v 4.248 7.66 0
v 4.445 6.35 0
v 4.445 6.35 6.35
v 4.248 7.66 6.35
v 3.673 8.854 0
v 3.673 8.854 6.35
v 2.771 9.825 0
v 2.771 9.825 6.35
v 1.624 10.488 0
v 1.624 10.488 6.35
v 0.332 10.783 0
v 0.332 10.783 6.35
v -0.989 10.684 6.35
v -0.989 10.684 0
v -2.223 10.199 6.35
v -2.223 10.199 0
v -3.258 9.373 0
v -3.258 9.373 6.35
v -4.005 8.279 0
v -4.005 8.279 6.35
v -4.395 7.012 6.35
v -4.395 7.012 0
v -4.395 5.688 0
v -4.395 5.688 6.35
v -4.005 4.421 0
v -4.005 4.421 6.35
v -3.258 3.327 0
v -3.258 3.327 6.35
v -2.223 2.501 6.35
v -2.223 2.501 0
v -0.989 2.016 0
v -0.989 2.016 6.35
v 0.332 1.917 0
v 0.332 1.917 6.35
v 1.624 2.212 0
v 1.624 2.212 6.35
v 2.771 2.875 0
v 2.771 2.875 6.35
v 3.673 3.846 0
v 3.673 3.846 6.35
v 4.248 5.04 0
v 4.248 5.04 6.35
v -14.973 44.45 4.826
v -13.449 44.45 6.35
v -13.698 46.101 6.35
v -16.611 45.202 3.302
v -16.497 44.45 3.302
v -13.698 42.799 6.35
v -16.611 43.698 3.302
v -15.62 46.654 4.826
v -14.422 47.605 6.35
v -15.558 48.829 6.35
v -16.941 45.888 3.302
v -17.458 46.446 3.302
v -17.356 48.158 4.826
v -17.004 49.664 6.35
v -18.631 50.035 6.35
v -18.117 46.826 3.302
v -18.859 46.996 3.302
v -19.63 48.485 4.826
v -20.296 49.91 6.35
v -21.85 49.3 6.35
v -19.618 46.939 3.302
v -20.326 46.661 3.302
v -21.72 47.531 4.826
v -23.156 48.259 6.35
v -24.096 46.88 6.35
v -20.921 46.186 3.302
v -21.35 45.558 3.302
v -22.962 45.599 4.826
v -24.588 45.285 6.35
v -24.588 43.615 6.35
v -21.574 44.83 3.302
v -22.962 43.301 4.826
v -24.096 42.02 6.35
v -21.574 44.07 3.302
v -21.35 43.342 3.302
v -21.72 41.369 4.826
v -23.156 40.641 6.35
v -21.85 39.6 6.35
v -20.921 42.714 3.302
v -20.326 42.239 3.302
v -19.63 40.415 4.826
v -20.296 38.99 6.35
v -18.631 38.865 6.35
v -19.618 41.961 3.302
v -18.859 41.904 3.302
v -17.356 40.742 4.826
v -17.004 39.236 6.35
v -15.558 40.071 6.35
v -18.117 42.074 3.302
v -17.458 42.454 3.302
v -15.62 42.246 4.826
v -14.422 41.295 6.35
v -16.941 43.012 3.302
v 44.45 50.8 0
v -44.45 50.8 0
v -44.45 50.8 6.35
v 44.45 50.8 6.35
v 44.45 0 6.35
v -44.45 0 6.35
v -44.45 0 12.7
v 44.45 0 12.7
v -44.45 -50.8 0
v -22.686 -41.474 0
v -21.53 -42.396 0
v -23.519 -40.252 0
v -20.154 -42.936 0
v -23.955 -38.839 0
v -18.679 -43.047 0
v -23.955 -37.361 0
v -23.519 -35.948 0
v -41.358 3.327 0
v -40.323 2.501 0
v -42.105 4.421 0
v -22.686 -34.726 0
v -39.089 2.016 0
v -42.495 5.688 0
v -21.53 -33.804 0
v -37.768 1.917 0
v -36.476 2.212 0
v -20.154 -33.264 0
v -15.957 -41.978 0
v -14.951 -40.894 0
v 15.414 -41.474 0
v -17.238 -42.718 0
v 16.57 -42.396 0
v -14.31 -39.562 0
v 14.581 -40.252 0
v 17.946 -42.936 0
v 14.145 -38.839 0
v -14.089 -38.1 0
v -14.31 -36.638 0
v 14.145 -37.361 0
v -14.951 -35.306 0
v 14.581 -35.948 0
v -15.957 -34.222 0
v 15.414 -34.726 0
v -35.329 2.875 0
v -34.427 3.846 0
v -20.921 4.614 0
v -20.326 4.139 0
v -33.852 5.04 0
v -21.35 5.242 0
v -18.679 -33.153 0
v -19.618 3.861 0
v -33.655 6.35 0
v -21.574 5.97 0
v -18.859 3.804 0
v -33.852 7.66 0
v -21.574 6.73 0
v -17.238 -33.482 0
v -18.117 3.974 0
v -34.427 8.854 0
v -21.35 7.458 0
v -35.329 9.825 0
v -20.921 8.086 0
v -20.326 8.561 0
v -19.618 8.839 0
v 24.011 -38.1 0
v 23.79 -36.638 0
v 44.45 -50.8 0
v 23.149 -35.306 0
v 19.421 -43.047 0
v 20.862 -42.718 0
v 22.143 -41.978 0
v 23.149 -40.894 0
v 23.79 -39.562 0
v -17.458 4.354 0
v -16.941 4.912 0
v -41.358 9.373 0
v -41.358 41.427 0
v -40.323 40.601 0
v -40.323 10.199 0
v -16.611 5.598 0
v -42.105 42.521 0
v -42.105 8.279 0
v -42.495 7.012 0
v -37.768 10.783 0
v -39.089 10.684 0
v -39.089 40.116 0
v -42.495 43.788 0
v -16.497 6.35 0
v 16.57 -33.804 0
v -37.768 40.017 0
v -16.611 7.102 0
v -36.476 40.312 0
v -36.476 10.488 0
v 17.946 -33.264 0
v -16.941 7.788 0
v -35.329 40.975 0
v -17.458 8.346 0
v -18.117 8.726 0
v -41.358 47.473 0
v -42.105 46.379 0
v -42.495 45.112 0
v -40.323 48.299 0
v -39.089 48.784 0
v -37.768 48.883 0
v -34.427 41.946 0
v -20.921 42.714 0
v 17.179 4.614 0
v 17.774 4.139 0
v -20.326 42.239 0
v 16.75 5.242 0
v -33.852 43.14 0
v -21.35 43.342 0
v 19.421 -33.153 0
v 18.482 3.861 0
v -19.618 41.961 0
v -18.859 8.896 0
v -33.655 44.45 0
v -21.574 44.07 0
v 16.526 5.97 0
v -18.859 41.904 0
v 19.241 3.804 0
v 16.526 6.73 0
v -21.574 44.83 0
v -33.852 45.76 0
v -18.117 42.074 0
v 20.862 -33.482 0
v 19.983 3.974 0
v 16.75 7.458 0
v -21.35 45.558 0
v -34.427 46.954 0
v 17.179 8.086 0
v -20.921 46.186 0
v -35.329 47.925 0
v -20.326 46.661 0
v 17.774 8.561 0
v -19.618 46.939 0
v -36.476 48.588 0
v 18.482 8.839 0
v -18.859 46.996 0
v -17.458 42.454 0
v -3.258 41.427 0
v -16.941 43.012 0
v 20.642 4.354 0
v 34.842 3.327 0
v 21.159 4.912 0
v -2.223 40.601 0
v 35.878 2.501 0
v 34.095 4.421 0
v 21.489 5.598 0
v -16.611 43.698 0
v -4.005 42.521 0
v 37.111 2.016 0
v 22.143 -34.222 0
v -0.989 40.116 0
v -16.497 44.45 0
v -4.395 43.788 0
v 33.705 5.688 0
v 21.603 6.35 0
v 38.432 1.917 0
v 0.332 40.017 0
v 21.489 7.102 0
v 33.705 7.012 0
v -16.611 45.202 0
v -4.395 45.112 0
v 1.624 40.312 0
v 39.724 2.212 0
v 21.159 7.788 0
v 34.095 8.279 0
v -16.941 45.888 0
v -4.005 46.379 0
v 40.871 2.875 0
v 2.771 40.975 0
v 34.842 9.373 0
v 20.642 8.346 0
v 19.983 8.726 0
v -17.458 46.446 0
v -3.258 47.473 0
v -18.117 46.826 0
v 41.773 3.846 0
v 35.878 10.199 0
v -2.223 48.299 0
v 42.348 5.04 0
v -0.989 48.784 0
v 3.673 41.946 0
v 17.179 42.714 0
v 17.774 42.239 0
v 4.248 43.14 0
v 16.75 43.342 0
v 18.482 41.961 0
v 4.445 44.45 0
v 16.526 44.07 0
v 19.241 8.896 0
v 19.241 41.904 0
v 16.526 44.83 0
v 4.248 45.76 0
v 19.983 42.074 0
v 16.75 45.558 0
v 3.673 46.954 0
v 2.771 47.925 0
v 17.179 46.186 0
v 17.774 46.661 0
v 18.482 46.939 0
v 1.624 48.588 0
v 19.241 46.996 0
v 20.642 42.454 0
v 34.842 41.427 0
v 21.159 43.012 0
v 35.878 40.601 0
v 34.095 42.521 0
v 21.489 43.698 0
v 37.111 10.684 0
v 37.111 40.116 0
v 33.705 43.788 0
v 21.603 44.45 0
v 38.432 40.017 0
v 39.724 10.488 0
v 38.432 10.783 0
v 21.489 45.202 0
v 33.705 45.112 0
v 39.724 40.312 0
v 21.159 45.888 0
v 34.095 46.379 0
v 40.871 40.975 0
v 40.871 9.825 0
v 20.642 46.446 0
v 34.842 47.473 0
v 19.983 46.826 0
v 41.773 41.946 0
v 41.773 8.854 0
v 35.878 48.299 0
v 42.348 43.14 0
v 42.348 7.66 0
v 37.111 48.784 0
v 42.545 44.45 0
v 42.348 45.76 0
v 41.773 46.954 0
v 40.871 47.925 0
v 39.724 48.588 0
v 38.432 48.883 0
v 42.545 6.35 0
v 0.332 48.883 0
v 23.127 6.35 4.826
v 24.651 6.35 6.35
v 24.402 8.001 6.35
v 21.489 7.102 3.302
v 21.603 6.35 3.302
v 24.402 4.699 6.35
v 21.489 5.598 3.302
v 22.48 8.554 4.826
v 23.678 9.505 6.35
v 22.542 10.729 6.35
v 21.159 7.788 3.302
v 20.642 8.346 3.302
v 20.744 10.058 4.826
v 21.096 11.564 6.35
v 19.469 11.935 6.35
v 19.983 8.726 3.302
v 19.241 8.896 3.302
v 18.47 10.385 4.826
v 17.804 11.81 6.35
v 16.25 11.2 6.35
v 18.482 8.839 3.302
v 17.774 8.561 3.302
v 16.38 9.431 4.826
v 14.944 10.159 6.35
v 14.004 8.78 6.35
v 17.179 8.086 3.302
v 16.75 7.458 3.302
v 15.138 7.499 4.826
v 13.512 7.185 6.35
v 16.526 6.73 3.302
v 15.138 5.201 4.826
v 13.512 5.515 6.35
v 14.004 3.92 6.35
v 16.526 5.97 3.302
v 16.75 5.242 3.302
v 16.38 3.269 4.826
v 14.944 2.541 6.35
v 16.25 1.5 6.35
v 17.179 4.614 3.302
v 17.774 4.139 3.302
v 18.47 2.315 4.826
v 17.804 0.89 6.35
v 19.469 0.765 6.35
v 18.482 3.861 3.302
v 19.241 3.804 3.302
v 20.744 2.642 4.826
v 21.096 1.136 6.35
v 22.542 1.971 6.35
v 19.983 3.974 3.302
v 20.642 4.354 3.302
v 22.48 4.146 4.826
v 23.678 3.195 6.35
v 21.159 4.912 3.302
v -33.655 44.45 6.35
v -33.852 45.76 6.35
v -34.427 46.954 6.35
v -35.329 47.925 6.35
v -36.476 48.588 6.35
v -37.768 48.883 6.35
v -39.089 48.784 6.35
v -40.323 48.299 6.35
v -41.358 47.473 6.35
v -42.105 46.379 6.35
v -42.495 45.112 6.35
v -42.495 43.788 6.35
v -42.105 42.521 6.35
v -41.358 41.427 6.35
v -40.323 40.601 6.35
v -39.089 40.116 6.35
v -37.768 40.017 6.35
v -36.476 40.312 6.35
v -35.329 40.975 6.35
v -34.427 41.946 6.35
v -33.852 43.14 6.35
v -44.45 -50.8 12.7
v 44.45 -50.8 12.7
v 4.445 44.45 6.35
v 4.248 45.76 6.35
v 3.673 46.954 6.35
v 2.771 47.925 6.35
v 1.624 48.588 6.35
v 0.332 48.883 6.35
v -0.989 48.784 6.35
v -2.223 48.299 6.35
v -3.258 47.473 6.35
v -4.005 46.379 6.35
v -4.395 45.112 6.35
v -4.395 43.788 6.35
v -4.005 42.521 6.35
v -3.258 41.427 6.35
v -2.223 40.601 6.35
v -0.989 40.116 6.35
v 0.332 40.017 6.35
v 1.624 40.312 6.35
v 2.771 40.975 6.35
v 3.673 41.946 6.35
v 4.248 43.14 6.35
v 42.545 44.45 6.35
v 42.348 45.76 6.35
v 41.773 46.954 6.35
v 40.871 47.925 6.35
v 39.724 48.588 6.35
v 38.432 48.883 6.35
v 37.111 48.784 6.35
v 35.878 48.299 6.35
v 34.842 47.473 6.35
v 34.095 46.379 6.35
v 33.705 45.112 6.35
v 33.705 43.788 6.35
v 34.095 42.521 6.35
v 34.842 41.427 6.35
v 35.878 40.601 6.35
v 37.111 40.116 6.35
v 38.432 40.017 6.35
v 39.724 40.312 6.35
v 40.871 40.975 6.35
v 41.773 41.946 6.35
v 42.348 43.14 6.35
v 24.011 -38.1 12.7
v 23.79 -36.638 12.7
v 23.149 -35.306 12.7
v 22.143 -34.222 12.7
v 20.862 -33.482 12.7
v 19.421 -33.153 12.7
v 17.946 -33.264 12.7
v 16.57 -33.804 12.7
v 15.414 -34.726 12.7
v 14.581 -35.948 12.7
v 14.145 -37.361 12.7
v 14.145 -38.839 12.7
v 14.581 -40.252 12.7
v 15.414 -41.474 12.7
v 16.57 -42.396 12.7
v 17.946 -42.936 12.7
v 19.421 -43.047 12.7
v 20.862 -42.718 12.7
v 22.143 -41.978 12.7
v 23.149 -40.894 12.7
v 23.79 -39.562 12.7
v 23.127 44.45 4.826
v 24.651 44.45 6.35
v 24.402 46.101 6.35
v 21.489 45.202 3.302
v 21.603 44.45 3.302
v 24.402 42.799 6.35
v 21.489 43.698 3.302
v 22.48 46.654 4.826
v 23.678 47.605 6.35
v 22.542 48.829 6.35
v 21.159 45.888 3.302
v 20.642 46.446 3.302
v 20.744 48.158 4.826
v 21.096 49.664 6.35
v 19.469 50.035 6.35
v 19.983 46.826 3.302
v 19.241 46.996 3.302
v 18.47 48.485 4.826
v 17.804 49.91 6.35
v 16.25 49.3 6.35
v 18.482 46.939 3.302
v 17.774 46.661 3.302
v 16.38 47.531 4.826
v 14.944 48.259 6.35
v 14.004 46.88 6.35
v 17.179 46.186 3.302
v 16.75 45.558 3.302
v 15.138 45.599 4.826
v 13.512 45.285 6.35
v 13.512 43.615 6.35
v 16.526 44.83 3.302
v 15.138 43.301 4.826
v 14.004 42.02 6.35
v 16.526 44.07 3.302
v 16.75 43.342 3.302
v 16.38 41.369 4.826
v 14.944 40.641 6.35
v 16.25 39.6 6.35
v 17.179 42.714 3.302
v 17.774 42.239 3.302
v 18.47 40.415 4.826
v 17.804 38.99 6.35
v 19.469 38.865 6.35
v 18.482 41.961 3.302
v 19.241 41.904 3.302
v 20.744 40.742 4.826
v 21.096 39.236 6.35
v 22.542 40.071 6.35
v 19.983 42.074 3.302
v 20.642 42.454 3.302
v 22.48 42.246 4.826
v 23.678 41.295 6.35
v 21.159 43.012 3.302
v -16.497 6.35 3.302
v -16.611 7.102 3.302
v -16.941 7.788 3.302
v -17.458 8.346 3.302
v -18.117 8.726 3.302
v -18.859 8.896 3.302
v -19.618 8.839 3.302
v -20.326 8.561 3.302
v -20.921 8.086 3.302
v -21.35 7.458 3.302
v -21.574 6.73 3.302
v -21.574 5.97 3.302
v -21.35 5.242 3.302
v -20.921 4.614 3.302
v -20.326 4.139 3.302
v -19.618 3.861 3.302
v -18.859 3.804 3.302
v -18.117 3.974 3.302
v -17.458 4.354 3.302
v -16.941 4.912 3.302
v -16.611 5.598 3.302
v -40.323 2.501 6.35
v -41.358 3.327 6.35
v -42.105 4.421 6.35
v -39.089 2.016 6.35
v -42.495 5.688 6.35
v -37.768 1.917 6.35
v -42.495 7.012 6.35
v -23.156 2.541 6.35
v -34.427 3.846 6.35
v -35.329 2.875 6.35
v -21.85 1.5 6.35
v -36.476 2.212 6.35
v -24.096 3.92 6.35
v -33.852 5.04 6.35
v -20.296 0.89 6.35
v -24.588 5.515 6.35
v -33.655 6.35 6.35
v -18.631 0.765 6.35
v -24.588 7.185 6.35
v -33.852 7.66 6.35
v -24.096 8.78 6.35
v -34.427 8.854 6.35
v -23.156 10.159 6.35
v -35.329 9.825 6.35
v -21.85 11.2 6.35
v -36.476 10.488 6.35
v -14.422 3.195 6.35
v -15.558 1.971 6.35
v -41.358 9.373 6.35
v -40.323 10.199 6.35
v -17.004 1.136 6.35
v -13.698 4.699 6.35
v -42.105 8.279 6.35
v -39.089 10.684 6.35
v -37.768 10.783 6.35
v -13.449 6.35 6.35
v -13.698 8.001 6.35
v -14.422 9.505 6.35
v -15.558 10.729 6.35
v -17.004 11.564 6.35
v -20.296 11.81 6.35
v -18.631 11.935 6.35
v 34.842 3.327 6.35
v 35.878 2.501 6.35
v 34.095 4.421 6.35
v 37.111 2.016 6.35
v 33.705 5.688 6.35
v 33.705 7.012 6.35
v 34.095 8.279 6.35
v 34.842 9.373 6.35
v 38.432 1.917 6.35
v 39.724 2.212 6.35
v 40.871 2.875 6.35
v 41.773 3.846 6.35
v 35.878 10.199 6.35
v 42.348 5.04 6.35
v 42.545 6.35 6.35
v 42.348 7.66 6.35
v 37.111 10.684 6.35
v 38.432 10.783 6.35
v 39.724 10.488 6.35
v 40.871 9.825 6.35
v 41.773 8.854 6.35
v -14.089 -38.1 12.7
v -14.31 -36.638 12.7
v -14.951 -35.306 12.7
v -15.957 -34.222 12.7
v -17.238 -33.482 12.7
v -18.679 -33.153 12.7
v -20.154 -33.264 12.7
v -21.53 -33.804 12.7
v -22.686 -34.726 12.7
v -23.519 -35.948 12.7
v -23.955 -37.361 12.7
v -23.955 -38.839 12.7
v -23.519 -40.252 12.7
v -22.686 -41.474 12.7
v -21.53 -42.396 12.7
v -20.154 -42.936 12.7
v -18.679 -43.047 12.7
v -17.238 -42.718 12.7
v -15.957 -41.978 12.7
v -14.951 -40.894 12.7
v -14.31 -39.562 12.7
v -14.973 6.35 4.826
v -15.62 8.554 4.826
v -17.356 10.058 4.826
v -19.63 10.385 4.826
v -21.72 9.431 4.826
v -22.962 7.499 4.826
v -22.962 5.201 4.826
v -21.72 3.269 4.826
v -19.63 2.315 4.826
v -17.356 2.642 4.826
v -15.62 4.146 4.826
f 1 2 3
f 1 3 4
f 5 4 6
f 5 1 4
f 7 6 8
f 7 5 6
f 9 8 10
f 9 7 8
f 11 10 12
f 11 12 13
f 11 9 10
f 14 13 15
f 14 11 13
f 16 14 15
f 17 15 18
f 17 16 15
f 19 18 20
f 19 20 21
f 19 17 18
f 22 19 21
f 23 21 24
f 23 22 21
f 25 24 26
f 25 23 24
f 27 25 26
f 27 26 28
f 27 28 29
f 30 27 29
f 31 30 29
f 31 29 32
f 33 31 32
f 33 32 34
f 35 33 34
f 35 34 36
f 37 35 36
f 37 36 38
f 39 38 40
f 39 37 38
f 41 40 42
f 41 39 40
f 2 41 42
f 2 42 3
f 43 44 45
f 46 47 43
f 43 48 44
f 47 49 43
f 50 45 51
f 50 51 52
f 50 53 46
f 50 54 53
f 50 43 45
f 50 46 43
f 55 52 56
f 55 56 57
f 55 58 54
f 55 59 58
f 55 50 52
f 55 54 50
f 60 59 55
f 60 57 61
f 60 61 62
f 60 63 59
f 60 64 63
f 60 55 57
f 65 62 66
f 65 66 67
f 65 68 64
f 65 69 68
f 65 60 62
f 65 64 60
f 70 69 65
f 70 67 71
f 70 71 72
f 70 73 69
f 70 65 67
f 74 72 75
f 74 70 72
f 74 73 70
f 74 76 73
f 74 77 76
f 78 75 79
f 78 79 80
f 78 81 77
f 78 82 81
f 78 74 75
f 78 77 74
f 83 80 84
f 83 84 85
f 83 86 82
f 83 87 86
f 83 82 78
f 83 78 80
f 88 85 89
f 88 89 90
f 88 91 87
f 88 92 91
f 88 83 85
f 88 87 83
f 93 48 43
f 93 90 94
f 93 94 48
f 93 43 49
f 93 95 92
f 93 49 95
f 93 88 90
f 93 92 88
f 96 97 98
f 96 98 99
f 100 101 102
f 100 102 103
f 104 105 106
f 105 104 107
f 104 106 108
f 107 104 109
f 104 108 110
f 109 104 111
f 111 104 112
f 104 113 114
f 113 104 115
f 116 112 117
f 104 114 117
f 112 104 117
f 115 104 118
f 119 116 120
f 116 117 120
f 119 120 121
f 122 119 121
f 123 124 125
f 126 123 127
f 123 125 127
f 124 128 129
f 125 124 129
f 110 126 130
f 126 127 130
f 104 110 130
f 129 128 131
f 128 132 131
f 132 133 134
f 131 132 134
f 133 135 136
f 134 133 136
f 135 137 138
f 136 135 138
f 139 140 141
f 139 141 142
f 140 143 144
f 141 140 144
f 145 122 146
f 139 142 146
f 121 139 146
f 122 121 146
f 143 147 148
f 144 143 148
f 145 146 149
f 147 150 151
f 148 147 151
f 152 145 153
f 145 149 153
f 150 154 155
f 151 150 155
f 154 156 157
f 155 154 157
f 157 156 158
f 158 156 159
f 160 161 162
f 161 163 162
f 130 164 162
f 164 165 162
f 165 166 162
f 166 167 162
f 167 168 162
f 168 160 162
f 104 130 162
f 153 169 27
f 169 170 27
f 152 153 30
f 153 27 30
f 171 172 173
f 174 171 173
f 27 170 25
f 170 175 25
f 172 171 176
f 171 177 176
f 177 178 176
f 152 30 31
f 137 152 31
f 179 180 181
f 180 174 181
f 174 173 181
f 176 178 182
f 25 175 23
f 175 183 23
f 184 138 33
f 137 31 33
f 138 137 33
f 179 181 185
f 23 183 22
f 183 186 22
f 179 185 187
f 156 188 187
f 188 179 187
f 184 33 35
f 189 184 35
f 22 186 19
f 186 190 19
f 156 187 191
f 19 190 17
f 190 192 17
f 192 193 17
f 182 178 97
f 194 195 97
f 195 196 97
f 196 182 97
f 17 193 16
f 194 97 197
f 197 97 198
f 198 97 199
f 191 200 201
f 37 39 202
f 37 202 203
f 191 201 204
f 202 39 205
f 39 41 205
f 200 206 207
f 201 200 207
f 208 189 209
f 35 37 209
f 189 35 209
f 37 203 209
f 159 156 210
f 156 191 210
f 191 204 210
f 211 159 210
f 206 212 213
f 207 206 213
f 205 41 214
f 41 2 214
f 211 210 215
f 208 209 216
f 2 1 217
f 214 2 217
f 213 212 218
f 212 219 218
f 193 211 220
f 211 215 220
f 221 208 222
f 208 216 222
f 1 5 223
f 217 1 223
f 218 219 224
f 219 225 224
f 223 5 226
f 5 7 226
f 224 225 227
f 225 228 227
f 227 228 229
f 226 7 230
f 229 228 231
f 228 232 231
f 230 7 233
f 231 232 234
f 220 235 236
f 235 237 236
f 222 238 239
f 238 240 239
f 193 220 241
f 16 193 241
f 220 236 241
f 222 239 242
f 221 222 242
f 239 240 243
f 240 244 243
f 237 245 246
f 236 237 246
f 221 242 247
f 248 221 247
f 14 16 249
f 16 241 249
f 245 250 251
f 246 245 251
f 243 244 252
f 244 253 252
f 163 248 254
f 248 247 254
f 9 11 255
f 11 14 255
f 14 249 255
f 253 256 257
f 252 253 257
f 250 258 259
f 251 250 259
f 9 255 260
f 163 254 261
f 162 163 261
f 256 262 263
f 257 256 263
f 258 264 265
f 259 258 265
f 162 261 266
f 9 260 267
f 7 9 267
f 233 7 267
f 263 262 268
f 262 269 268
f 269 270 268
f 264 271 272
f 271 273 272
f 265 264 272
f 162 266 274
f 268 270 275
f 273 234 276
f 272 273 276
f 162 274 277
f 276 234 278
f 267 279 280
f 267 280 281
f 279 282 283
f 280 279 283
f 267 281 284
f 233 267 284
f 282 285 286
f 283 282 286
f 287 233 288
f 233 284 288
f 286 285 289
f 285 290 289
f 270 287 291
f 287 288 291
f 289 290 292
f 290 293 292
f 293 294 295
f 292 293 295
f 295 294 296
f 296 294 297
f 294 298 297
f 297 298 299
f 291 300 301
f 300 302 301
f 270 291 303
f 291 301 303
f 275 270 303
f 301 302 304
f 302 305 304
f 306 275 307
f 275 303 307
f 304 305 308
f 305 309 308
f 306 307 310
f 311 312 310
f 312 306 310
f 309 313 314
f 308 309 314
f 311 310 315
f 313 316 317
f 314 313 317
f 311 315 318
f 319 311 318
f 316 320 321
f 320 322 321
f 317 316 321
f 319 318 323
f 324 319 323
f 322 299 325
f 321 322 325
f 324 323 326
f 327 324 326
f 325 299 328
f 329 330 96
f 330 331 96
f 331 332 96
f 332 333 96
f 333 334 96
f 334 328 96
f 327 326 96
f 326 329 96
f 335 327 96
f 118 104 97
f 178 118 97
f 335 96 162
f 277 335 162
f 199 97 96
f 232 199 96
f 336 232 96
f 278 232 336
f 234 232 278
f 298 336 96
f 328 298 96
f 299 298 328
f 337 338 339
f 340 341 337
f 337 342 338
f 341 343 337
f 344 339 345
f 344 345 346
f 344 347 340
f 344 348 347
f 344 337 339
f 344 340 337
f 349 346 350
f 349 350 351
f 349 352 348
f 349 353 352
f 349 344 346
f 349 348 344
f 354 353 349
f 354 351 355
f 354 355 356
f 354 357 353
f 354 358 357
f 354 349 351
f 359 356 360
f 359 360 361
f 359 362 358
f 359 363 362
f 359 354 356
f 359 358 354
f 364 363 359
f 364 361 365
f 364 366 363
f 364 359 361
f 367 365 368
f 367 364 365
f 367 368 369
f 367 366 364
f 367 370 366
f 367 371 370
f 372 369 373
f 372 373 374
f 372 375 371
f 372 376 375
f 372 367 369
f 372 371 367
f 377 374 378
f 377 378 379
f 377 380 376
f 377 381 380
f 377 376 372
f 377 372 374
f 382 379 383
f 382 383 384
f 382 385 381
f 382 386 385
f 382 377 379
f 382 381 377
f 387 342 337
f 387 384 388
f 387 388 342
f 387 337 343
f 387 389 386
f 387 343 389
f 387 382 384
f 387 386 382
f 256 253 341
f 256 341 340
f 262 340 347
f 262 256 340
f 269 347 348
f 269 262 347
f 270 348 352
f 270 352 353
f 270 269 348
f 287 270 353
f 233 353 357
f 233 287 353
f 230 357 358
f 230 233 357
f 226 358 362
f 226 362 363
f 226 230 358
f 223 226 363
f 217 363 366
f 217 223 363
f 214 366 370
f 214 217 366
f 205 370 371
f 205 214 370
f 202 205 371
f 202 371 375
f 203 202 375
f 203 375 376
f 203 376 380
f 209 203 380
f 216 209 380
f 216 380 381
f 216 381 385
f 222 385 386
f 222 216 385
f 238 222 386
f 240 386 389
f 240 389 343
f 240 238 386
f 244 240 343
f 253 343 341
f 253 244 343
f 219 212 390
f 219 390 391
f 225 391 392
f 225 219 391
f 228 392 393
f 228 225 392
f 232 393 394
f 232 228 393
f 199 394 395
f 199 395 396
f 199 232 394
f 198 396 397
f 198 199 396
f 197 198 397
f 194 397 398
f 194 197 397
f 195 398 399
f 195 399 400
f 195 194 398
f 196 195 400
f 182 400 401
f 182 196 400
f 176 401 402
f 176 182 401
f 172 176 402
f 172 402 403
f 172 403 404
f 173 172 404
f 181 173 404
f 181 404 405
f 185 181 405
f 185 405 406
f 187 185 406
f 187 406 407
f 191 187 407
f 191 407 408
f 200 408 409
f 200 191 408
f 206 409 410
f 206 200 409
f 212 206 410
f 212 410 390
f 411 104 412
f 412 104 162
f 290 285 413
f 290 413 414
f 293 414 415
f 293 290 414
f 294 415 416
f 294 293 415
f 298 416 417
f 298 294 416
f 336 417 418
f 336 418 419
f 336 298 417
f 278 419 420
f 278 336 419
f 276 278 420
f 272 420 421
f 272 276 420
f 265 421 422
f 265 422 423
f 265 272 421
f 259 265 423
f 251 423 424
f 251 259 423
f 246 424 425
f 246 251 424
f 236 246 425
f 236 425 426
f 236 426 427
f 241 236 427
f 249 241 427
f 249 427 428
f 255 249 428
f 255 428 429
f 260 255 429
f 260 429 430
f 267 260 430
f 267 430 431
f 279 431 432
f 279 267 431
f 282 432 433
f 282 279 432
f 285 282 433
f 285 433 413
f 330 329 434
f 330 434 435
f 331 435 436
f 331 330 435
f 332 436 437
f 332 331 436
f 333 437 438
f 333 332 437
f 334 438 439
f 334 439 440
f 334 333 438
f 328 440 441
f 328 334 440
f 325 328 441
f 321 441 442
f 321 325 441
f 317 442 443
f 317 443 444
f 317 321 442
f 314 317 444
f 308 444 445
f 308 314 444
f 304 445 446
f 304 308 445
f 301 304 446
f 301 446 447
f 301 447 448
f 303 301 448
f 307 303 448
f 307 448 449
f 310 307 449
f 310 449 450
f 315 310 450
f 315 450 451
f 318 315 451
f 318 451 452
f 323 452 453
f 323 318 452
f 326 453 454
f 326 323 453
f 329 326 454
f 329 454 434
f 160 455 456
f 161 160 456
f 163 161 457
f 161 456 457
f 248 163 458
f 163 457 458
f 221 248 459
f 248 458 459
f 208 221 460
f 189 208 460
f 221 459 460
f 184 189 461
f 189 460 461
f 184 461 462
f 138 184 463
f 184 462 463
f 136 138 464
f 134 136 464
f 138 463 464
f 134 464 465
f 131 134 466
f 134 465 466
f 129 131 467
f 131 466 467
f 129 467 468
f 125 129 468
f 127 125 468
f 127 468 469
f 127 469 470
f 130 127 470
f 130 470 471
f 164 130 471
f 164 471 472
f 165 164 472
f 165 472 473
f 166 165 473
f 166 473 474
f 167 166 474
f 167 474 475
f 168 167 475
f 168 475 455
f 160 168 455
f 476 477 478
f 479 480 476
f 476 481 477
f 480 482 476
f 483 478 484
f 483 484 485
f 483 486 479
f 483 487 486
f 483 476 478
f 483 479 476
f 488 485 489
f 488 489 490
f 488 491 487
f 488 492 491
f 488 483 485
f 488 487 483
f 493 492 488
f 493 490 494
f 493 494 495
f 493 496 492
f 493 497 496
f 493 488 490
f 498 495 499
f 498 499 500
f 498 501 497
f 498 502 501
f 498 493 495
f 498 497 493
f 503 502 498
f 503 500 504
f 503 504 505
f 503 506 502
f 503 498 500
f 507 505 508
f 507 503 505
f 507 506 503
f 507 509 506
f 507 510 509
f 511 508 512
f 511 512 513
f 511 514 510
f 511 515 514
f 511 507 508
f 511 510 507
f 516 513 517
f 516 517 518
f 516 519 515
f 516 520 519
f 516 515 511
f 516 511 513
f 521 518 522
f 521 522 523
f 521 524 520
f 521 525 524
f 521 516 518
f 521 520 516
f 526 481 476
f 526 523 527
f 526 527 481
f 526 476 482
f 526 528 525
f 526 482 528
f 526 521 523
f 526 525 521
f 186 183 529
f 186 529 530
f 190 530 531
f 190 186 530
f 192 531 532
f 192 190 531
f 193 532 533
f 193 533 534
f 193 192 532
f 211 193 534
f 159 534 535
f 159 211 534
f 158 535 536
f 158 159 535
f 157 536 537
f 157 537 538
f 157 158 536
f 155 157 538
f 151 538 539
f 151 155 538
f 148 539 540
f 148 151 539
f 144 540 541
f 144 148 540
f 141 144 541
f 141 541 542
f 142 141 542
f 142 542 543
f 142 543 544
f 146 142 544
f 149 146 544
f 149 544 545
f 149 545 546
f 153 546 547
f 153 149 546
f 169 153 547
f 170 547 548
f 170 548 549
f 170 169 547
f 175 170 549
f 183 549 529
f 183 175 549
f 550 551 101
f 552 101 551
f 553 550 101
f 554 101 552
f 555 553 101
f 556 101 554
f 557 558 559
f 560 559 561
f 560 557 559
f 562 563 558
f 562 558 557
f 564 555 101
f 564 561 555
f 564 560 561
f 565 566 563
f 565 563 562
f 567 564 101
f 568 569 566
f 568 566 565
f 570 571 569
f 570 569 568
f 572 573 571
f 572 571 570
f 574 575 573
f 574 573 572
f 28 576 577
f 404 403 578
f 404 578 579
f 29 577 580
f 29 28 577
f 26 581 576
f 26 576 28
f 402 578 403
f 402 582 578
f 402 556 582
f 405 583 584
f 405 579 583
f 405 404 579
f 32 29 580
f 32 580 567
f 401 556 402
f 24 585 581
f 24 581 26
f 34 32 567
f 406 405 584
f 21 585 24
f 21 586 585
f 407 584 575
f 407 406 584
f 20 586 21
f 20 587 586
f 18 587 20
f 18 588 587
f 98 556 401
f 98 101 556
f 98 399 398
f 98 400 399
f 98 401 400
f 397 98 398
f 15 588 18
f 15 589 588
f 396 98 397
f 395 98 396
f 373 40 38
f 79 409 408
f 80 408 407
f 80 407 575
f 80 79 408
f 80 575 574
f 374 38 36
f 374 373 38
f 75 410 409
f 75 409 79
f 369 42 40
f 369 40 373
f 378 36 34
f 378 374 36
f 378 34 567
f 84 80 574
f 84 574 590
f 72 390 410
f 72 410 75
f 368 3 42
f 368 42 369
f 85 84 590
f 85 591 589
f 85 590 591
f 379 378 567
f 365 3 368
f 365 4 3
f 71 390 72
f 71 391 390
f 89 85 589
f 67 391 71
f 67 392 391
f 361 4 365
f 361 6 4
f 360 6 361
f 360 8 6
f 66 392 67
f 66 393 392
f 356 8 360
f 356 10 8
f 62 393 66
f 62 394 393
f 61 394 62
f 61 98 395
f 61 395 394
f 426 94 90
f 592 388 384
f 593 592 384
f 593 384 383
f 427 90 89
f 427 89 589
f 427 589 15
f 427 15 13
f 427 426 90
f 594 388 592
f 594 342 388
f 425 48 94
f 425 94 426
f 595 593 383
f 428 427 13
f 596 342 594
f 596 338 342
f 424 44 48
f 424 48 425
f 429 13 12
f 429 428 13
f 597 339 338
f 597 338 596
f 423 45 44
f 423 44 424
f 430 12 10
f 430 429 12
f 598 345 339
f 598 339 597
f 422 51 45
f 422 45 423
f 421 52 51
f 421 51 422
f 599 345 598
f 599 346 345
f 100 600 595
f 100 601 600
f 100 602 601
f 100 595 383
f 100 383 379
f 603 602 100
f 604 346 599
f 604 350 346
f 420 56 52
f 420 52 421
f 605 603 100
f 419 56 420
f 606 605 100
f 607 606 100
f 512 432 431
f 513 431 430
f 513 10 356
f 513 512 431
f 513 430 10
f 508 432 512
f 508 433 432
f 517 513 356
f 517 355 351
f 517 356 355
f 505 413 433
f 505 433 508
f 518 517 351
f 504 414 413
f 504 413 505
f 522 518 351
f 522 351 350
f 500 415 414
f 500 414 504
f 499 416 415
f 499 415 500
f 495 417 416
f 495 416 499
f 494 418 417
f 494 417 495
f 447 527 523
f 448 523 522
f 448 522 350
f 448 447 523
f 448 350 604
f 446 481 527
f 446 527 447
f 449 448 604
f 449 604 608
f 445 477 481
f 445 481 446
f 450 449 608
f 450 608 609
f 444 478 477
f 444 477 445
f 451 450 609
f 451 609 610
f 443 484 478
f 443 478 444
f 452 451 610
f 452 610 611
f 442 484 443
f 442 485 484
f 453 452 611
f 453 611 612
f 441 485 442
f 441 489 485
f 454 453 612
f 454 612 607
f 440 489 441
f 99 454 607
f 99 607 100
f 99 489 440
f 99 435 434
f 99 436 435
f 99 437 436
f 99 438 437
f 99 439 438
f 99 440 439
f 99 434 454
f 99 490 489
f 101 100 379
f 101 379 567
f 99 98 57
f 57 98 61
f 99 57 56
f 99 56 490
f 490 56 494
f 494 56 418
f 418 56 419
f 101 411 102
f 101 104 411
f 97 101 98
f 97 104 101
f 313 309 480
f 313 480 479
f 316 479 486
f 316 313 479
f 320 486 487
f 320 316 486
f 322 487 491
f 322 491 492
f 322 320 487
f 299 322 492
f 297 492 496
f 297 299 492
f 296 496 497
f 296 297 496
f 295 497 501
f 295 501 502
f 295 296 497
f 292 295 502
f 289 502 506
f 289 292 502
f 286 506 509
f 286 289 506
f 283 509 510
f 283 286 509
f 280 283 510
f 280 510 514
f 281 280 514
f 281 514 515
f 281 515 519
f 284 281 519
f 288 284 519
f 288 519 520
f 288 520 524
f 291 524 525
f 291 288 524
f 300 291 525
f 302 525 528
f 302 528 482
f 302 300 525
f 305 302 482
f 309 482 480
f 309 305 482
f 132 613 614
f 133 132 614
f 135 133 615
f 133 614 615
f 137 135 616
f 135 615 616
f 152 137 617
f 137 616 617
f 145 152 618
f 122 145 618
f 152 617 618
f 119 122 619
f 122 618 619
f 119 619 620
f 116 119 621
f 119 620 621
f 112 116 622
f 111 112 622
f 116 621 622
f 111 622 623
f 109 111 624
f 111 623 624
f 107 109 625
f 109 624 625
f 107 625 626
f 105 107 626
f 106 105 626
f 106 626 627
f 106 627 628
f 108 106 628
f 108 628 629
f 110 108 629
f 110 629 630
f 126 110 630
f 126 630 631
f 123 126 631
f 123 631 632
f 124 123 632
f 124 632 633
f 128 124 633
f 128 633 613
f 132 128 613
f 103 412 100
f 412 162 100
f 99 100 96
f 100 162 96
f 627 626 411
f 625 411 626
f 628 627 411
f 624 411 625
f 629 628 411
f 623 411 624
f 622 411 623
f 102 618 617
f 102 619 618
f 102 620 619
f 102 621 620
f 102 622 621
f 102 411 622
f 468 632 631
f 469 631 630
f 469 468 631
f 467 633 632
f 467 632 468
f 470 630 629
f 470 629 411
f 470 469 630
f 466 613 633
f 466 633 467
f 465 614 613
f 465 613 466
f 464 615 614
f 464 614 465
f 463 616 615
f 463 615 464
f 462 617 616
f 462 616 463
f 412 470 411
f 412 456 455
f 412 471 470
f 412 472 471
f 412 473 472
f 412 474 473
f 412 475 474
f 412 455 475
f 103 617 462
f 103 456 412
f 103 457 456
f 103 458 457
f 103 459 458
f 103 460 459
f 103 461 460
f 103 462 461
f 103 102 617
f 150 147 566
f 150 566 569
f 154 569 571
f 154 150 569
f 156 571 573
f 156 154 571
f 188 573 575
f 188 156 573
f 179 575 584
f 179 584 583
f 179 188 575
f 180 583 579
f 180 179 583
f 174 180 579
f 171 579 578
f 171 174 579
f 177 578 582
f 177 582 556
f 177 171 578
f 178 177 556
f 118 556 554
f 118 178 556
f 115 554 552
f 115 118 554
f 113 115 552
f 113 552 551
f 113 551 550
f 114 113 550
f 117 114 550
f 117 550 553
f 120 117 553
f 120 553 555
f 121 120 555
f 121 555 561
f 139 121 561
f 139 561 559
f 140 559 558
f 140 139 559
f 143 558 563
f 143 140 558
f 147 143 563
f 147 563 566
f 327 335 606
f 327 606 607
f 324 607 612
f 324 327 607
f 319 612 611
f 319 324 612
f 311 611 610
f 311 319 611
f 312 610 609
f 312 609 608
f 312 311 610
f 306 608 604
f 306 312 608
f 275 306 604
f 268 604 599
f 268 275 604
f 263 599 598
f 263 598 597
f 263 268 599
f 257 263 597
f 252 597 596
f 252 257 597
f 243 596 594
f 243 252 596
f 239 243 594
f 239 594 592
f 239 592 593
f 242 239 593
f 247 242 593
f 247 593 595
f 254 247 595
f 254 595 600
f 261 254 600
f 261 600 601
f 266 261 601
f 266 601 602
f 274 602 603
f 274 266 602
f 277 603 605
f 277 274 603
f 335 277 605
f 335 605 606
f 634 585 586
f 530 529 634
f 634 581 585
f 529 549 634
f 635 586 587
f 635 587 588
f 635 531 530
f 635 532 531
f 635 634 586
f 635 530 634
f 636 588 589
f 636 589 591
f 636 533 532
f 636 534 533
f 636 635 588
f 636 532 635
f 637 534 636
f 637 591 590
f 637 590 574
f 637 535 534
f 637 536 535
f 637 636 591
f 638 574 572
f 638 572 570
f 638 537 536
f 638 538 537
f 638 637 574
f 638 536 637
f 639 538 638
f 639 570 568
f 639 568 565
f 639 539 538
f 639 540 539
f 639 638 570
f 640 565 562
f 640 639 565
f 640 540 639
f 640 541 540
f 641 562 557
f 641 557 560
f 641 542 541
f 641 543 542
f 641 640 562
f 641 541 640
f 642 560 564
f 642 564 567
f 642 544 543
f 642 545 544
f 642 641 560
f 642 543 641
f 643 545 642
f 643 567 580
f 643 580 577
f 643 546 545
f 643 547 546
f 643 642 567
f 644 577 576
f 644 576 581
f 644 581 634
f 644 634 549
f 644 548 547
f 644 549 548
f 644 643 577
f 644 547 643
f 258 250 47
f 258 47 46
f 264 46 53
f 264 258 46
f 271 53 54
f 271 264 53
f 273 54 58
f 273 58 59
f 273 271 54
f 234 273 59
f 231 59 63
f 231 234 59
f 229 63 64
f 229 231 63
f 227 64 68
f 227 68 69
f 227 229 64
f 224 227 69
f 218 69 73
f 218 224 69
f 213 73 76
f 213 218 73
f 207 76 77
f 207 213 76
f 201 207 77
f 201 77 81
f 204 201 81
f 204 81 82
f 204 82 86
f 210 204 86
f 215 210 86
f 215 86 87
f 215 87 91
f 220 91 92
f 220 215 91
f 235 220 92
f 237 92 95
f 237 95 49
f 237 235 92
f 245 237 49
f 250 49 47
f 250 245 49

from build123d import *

# Parameters (mm, degrees)
F0_W     = 88.9
F0_H     = 101.6
F0_R     = 4.445
F0_R_2   = 2.5527
F1_DEPTH = 6.35
F2_W     = 88.9
F2_H     = 50.8
F3_DEPTH = 6.35
F4_R     = 4.96062
F5_DEPTH = 25.4
F6_SIZE  = 3.048


with BuildPart() as f1:
    # F0 (on Top) → F1 (new body)
    with BuildSketch(Plane.XY):
        Rectangle(F0_W, F0_H)
        with Locations((-38.1, 6.35)):
            Circle(F0_R, mode=Mode.SUBTRACT)
        with Locations((-19.05, 6.35)):
            Circle(F0_R_2, mode=Mode.SUBTRACT)
        with Locations((-38.1, 44.45)):
            Circle(F0_R, mode=Mode.SUBTRACT)
        with Locations((-19.05, 44.45)):
            Circle(F0_R_2, mode=Mode.SUBTRACT)
        with Locations((0, 6.35)):
            Circle(F0_R, mode=Mode.SUBTRACT)
        with Locations((19.05, 6.35)):
            Circle(F0_R_2, mode=Mode.SUBTRACT)
        with Locations((38.1, 6.35)):
            Circle(F0_R, mode=Mode.SUBTRACT)
        with Locations((0, 44.45)):
            Circle(F0_R, mode=Mode.SUBTRACT)
        with Locations((19.05, 44.45)):
            Circle(F0_R_2, mode=Mode.SUBTRACT)
        with Locations((38.1, 44.45)):
            Circle(F0_R, mode=Mode.SUBTRACT)
    extrude(amount=F1_DEPTH)

    # F2 (on face) → F3 (join)
    with BuildSketch(Plane.XY.offset(6.35)):
        with Locations((0, -25.4)):
            Rectangle(F2_W, F2_H)
    extrude(amount=F3_DEPTH)

    # F4 (on face) → F5 (cut)
    with BuildSketch(Plane.XY.offset(12.7)):
        with Locations((-19.05, -38.1)):
            Circle(F4_R)
        with Locations((19.05, -38.1)):
            Circle(F4_R)
    extrude(amount=-F5_DEPTH, mode=Mode.SUBTRACT)

    # F6
    f6_edges = [f1.edges().sort_by_distance(p)[0] for p in [
        (-21.6027, 44.45, 6.35),
        (16.4973, 44.45, 6.35),
        (16.4973, 6.35, 6.35),
        (-21.6027, 6.35, 6.35),
    ]]
    chamfer(f6_edges, length=F6_SIZE)


solid = f1.part
